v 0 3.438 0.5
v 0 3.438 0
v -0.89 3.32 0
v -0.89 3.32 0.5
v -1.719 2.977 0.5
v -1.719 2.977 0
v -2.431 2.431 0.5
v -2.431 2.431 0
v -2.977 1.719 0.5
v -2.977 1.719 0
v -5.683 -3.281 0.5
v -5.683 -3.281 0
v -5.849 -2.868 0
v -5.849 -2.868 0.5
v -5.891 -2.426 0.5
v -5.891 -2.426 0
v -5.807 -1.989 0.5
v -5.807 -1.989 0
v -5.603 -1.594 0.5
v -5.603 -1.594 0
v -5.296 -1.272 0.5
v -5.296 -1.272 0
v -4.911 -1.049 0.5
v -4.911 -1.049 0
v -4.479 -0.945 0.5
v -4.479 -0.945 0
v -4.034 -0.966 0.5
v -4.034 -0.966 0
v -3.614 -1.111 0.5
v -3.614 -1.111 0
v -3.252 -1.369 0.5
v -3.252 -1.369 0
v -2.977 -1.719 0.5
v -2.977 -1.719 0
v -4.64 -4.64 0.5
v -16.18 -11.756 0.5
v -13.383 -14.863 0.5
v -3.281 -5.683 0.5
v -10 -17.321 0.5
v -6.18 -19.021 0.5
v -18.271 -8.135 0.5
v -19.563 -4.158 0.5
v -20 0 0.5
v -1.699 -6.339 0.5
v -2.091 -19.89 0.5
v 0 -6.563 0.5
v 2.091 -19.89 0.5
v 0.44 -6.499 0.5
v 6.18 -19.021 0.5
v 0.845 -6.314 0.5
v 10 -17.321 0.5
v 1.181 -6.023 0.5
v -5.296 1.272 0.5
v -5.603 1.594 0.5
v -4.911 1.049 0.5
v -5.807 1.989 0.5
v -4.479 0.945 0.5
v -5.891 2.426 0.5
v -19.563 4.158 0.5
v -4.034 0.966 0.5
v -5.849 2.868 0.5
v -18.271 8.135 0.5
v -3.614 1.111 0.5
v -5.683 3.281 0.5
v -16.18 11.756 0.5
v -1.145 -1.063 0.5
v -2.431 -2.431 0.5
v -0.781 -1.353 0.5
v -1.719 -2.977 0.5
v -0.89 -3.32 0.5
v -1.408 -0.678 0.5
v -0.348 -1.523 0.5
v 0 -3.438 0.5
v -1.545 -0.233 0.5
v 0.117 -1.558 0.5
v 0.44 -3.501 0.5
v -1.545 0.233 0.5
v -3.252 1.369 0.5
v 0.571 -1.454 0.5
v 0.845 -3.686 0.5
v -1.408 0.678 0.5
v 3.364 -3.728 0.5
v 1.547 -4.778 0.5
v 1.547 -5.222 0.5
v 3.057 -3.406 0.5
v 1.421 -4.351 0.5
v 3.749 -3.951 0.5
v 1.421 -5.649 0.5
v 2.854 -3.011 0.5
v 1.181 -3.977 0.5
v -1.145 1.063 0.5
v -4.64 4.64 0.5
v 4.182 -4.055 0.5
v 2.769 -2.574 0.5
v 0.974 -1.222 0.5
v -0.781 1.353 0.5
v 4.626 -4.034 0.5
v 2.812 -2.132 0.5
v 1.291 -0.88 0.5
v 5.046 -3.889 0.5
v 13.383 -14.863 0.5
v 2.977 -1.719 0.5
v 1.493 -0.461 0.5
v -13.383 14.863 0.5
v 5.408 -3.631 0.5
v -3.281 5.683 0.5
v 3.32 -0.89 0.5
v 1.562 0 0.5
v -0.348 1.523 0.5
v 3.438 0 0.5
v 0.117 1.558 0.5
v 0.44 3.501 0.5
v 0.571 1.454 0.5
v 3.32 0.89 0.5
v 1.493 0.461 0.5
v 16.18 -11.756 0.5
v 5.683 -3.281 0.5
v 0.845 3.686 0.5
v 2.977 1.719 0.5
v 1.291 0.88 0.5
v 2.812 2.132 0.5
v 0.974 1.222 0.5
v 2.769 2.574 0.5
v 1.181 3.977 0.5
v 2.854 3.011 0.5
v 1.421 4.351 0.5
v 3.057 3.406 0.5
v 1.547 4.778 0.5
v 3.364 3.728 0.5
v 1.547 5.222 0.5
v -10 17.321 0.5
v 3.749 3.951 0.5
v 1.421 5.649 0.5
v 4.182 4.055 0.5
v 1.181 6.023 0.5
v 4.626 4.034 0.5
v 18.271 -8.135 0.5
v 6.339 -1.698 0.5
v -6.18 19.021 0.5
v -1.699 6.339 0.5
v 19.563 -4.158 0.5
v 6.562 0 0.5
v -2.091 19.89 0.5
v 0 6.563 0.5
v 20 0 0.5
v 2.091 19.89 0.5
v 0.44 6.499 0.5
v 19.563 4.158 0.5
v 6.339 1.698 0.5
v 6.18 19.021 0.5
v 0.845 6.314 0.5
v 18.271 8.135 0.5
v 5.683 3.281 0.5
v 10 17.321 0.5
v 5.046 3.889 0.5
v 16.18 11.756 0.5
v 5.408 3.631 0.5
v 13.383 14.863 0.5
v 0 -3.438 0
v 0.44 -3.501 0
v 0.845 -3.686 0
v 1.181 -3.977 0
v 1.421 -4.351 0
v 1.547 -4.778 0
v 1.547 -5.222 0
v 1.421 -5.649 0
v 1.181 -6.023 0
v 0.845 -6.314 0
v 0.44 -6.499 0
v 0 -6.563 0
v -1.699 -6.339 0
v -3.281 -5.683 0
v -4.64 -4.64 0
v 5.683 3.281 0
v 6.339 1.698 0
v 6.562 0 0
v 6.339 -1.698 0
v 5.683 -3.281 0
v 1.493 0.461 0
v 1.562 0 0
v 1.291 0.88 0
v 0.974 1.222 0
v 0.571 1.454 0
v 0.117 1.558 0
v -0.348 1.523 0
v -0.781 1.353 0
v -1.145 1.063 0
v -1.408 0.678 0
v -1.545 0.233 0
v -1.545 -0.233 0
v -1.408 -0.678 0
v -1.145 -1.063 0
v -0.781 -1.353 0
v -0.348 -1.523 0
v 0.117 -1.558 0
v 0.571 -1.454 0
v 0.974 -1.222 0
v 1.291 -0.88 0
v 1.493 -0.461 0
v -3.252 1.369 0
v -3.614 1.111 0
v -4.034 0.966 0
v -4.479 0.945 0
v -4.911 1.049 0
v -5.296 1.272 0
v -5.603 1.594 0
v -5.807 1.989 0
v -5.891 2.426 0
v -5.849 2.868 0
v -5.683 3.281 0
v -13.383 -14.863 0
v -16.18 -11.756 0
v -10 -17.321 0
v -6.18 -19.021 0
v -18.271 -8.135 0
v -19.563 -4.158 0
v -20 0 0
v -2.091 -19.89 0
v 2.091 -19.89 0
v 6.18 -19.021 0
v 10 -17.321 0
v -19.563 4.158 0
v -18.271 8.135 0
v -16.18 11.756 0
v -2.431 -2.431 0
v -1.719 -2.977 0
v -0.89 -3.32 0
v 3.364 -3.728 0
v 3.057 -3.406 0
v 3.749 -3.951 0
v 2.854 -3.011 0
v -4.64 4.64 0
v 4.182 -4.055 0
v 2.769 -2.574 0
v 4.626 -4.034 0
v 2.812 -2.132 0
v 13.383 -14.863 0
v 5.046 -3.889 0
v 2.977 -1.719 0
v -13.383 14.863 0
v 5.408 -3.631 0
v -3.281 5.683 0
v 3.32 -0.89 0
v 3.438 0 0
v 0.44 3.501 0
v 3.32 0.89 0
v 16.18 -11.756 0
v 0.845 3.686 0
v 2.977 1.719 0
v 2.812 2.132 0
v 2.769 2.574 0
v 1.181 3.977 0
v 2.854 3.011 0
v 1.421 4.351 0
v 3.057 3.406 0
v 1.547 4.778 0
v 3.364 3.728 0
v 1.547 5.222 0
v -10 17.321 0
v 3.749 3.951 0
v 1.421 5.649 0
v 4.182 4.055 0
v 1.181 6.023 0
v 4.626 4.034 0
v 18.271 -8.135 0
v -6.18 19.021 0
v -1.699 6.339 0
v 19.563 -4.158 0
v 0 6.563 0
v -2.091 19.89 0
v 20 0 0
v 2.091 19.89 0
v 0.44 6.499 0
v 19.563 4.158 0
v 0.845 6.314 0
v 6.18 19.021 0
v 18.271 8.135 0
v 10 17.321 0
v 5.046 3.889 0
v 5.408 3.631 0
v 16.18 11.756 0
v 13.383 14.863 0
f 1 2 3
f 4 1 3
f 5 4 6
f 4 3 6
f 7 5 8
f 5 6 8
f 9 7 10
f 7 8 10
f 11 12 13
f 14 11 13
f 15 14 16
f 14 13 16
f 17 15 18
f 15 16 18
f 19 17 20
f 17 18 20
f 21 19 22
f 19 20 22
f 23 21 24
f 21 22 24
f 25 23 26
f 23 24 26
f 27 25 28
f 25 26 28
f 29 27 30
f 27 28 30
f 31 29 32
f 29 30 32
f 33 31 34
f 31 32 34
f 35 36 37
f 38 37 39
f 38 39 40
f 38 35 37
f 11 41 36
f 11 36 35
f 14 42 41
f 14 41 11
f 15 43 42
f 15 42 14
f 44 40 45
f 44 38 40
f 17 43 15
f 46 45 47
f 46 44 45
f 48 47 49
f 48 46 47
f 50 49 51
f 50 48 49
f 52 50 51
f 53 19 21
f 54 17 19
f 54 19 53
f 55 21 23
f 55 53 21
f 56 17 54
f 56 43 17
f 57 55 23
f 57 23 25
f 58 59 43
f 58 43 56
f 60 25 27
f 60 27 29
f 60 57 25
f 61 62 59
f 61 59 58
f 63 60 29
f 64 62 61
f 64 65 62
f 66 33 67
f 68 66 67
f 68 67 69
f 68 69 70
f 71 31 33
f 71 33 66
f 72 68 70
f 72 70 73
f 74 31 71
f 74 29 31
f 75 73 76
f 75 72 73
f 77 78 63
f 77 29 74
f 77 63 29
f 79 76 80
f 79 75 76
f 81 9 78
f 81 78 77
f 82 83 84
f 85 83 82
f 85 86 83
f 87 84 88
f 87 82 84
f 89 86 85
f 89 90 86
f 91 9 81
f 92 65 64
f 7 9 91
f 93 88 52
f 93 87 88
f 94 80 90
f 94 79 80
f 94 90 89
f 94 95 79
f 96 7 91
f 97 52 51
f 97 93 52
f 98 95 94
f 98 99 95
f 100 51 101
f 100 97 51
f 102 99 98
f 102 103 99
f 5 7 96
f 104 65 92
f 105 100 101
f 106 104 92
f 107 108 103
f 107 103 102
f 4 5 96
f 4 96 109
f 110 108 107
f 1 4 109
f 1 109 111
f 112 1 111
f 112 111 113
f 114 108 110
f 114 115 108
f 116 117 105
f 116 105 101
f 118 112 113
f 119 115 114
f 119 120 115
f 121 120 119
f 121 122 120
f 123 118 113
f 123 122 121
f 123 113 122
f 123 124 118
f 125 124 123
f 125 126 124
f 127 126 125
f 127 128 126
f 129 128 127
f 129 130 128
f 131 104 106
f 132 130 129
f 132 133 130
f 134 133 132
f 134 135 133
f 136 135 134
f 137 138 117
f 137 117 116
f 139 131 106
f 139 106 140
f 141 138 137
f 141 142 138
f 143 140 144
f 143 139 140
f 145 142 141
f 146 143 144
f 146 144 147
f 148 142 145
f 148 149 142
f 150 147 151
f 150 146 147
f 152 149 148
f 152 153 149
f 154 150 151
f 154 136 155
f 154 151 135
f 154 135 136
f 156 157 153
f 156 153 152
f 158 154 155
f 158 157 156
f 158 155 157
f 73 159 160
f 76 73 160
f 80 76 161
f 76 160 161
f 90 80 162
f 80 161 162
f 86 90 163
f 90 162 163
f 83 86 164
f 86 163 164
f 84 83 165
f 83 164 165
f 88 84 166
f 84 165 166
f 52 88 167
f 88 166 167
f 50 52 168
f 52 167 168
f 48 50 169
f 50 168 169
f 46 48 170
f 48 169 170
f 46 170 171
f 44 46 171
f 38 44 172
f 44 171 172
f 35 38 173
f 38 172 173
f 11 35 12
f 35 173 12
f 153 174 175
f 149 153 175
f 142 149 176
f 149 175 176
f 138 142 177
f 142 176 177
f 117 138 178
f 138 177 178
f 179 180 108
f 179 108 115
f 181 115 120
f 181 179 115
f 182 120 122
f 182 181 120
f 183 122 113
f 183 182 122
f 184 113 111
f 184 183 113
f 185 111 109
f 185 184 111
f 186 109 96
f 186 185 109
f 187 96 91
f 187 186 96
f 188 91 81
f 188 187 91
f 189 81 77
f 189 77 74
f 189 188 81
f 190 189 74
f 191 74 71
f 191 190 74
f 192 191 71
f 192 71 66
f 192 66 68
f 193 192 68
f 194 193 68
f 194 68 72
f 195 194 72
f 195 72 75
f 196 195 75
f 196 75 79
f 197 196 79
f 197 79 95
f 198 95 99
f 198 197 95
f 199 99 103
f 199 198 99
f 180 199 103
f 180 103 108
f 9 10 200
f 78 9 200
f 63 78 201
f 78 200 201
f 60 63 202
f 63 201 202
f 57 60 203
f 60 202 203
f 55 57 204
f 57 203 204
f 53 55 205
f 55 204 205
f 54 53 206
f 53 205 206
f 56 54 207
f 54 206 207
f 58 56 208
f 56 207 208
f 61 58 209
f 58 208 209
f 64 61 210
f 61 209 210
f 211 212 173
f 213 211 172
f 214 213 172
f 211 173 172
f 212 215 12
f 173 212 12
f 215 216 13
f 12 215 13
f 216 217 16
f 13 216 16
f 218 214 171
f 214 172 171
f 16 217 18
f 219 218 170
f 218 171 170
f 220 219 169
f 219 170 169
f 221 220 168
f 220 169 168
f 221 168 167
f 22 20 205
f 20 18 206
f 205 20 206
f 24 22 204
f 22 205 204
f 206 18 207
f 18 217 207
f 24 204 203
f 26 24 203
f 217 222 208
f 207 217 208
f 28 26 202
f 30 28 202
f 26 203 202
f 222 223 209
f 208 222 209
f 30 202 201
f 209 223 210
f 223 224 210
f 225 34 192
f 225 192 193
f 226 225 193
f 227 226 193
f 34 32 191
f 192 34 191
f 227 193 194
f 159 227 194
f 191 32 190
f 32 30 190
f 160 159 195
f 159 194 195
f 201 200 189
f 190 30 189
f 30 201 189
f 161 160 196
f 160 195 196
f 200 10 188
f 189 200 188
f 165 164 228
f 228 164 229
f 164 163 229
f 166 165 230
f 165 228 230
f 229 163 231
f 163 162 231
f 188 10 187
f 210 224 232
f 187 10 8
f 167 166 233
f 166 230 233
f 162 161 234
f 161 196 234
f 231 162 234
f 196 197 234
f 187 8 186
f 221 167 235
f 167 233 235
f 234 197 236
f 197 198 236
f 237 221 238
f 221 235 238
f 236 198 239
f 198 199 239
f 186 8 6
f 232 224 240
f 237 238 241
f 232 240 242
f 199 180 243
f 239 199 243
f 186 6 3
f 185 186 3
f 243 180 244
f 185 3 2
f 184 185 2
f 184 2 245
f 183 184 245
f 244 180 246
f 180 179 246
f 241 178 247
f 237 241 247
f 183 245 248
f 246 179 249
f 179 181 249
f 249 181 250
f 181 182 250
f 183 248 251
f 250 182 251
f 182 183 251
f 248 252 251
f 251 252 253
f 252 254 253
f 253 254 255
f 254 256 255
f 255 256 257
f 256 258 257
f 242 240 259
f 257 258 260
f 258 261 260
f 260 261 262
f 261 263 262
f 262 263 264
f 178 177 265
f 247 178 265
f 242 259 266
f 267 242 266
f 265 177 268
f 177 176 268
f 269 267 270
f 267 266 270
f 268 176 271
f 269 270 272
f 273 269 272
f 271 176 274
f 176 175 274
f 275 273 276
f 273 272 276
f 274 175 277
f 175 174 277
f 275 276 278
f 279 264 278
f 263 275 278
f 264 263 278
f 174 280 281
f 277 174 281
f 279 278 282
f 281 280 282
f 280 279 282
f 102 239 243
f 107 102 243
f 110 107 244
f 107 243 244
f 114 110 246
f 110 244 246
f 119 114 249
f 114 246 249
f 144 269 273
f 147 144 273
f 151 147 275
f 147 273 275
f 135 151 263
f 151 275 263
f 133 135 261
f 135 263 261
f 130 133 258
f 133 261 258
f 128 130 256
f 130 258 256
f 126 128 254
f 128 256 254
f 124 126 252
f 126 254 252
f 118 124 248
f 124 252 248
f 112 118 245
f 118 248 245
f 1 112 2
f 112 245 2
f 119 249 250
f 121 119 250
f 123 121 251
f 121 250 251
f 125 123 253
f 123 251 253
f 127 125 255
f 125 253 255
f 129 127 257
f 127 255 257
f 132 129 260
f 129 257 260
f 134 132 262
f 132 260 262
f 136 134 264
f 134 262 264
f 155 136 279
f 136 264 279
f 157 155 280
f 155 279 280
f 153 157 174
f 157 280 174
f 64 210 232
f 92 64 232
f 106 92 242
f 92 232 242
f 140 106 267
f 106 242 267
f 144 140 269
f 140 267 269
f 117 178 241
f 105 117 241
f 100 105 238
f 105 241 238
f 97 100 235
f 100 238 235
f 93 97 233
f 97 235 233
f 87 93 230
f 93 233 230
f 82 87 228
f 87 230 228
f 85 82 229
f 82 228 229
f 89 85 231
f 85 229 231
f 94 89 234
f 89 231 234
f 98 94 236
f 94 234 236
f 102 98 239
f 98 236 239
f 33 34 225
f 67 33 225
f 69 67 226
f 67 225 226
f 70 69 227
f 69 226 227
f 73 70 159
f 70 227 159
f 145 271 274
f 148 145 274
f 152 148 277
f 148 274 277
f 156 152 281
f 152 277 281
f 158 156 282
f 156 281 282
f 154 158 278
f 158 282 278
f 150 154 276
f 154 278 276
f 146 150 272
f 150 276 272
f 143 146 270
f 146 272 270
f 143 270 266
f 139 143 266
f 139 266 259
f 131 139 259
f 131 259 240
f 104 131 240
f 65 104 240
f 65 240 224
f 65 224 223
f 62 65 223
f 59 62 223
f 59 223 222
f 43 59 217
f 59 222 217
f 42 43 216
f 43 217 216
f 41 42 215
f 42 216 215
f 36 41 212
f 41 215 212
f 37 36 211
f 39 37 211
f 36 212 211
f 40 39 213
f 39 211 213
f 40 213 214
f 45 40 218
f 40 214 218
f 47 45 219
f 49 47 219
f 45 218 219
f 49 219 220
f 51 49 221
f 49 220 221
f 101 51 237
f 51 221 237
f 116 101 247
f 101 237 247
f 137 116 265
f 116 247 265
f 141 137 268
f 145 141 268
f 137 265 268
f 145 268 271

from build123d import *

# Parameters (mm, degrees)
F0_R     = 20
F0_R_2   = 1.5625
F1_DEPTH = 0.5


with BuildPart() as f1:
    # F0 (on Top) → F1 (new body)
    with BuildSketch(Plane.XY):
        Circle(F0_R)
        with BuildLine():
            ThreePointArc((-5.683292, -3.28125), (-5.111377, -1.146835), (-2.976962, -1.71875))
            ThreePointArc((-2.976962, -1.71875), (-1.71875, -2.976962), (0, -3.4375))
            ThreePointArc((0, -3.4375), (1.5625, -5), (0, -6.5625))
            ThreePointArc((0, -6.5625), (-3.28125, -5.683292), (-5.683292, -3.28125))
        make_face(mode=Mode.SUBTRACT)
        with BuildLine():
            ThreePointArc((0, 6.5625), (1.5625, 5), (0, 3.4375))
            ThreePointArc((0, 3.4375), (-1.71875, 2.976962), (-2.976962, 1.71875))
            ThreePointArc((-2.976962, 1.71875), (-5.111377, 1.146835), (-5.683292, 3.28125))
            ThreePointArc((-5.683292, 3.28125), (-3.28125, 5.683292), (0, 6.5625))
        make_face(mode=Mode.SUBTRACT)
        Circle(F0_R_2, mode=Mode.SUBTRACT)
        with BuildLine():
            ThreePointArc((5.683292, -3.28125), (3.548877, -3.853165), (2.976962, -1.71875))
            ThreePointArc((2.976962, -1.71875), (3.4375, 0), (2.976962, 1.71875))
            ThreePointArc((2.976962, 1.71875), (3.548877, 3.853165), (5.683292, 3.28125))
            ThreePointArc((5.683292, 3.28125), (6.5625, 0), (5.683292, -3.28125))
        make_face(mode=Mode.SUBTRACT)
    extrude(amount=F1_DEPTH)


solid = f1.part
